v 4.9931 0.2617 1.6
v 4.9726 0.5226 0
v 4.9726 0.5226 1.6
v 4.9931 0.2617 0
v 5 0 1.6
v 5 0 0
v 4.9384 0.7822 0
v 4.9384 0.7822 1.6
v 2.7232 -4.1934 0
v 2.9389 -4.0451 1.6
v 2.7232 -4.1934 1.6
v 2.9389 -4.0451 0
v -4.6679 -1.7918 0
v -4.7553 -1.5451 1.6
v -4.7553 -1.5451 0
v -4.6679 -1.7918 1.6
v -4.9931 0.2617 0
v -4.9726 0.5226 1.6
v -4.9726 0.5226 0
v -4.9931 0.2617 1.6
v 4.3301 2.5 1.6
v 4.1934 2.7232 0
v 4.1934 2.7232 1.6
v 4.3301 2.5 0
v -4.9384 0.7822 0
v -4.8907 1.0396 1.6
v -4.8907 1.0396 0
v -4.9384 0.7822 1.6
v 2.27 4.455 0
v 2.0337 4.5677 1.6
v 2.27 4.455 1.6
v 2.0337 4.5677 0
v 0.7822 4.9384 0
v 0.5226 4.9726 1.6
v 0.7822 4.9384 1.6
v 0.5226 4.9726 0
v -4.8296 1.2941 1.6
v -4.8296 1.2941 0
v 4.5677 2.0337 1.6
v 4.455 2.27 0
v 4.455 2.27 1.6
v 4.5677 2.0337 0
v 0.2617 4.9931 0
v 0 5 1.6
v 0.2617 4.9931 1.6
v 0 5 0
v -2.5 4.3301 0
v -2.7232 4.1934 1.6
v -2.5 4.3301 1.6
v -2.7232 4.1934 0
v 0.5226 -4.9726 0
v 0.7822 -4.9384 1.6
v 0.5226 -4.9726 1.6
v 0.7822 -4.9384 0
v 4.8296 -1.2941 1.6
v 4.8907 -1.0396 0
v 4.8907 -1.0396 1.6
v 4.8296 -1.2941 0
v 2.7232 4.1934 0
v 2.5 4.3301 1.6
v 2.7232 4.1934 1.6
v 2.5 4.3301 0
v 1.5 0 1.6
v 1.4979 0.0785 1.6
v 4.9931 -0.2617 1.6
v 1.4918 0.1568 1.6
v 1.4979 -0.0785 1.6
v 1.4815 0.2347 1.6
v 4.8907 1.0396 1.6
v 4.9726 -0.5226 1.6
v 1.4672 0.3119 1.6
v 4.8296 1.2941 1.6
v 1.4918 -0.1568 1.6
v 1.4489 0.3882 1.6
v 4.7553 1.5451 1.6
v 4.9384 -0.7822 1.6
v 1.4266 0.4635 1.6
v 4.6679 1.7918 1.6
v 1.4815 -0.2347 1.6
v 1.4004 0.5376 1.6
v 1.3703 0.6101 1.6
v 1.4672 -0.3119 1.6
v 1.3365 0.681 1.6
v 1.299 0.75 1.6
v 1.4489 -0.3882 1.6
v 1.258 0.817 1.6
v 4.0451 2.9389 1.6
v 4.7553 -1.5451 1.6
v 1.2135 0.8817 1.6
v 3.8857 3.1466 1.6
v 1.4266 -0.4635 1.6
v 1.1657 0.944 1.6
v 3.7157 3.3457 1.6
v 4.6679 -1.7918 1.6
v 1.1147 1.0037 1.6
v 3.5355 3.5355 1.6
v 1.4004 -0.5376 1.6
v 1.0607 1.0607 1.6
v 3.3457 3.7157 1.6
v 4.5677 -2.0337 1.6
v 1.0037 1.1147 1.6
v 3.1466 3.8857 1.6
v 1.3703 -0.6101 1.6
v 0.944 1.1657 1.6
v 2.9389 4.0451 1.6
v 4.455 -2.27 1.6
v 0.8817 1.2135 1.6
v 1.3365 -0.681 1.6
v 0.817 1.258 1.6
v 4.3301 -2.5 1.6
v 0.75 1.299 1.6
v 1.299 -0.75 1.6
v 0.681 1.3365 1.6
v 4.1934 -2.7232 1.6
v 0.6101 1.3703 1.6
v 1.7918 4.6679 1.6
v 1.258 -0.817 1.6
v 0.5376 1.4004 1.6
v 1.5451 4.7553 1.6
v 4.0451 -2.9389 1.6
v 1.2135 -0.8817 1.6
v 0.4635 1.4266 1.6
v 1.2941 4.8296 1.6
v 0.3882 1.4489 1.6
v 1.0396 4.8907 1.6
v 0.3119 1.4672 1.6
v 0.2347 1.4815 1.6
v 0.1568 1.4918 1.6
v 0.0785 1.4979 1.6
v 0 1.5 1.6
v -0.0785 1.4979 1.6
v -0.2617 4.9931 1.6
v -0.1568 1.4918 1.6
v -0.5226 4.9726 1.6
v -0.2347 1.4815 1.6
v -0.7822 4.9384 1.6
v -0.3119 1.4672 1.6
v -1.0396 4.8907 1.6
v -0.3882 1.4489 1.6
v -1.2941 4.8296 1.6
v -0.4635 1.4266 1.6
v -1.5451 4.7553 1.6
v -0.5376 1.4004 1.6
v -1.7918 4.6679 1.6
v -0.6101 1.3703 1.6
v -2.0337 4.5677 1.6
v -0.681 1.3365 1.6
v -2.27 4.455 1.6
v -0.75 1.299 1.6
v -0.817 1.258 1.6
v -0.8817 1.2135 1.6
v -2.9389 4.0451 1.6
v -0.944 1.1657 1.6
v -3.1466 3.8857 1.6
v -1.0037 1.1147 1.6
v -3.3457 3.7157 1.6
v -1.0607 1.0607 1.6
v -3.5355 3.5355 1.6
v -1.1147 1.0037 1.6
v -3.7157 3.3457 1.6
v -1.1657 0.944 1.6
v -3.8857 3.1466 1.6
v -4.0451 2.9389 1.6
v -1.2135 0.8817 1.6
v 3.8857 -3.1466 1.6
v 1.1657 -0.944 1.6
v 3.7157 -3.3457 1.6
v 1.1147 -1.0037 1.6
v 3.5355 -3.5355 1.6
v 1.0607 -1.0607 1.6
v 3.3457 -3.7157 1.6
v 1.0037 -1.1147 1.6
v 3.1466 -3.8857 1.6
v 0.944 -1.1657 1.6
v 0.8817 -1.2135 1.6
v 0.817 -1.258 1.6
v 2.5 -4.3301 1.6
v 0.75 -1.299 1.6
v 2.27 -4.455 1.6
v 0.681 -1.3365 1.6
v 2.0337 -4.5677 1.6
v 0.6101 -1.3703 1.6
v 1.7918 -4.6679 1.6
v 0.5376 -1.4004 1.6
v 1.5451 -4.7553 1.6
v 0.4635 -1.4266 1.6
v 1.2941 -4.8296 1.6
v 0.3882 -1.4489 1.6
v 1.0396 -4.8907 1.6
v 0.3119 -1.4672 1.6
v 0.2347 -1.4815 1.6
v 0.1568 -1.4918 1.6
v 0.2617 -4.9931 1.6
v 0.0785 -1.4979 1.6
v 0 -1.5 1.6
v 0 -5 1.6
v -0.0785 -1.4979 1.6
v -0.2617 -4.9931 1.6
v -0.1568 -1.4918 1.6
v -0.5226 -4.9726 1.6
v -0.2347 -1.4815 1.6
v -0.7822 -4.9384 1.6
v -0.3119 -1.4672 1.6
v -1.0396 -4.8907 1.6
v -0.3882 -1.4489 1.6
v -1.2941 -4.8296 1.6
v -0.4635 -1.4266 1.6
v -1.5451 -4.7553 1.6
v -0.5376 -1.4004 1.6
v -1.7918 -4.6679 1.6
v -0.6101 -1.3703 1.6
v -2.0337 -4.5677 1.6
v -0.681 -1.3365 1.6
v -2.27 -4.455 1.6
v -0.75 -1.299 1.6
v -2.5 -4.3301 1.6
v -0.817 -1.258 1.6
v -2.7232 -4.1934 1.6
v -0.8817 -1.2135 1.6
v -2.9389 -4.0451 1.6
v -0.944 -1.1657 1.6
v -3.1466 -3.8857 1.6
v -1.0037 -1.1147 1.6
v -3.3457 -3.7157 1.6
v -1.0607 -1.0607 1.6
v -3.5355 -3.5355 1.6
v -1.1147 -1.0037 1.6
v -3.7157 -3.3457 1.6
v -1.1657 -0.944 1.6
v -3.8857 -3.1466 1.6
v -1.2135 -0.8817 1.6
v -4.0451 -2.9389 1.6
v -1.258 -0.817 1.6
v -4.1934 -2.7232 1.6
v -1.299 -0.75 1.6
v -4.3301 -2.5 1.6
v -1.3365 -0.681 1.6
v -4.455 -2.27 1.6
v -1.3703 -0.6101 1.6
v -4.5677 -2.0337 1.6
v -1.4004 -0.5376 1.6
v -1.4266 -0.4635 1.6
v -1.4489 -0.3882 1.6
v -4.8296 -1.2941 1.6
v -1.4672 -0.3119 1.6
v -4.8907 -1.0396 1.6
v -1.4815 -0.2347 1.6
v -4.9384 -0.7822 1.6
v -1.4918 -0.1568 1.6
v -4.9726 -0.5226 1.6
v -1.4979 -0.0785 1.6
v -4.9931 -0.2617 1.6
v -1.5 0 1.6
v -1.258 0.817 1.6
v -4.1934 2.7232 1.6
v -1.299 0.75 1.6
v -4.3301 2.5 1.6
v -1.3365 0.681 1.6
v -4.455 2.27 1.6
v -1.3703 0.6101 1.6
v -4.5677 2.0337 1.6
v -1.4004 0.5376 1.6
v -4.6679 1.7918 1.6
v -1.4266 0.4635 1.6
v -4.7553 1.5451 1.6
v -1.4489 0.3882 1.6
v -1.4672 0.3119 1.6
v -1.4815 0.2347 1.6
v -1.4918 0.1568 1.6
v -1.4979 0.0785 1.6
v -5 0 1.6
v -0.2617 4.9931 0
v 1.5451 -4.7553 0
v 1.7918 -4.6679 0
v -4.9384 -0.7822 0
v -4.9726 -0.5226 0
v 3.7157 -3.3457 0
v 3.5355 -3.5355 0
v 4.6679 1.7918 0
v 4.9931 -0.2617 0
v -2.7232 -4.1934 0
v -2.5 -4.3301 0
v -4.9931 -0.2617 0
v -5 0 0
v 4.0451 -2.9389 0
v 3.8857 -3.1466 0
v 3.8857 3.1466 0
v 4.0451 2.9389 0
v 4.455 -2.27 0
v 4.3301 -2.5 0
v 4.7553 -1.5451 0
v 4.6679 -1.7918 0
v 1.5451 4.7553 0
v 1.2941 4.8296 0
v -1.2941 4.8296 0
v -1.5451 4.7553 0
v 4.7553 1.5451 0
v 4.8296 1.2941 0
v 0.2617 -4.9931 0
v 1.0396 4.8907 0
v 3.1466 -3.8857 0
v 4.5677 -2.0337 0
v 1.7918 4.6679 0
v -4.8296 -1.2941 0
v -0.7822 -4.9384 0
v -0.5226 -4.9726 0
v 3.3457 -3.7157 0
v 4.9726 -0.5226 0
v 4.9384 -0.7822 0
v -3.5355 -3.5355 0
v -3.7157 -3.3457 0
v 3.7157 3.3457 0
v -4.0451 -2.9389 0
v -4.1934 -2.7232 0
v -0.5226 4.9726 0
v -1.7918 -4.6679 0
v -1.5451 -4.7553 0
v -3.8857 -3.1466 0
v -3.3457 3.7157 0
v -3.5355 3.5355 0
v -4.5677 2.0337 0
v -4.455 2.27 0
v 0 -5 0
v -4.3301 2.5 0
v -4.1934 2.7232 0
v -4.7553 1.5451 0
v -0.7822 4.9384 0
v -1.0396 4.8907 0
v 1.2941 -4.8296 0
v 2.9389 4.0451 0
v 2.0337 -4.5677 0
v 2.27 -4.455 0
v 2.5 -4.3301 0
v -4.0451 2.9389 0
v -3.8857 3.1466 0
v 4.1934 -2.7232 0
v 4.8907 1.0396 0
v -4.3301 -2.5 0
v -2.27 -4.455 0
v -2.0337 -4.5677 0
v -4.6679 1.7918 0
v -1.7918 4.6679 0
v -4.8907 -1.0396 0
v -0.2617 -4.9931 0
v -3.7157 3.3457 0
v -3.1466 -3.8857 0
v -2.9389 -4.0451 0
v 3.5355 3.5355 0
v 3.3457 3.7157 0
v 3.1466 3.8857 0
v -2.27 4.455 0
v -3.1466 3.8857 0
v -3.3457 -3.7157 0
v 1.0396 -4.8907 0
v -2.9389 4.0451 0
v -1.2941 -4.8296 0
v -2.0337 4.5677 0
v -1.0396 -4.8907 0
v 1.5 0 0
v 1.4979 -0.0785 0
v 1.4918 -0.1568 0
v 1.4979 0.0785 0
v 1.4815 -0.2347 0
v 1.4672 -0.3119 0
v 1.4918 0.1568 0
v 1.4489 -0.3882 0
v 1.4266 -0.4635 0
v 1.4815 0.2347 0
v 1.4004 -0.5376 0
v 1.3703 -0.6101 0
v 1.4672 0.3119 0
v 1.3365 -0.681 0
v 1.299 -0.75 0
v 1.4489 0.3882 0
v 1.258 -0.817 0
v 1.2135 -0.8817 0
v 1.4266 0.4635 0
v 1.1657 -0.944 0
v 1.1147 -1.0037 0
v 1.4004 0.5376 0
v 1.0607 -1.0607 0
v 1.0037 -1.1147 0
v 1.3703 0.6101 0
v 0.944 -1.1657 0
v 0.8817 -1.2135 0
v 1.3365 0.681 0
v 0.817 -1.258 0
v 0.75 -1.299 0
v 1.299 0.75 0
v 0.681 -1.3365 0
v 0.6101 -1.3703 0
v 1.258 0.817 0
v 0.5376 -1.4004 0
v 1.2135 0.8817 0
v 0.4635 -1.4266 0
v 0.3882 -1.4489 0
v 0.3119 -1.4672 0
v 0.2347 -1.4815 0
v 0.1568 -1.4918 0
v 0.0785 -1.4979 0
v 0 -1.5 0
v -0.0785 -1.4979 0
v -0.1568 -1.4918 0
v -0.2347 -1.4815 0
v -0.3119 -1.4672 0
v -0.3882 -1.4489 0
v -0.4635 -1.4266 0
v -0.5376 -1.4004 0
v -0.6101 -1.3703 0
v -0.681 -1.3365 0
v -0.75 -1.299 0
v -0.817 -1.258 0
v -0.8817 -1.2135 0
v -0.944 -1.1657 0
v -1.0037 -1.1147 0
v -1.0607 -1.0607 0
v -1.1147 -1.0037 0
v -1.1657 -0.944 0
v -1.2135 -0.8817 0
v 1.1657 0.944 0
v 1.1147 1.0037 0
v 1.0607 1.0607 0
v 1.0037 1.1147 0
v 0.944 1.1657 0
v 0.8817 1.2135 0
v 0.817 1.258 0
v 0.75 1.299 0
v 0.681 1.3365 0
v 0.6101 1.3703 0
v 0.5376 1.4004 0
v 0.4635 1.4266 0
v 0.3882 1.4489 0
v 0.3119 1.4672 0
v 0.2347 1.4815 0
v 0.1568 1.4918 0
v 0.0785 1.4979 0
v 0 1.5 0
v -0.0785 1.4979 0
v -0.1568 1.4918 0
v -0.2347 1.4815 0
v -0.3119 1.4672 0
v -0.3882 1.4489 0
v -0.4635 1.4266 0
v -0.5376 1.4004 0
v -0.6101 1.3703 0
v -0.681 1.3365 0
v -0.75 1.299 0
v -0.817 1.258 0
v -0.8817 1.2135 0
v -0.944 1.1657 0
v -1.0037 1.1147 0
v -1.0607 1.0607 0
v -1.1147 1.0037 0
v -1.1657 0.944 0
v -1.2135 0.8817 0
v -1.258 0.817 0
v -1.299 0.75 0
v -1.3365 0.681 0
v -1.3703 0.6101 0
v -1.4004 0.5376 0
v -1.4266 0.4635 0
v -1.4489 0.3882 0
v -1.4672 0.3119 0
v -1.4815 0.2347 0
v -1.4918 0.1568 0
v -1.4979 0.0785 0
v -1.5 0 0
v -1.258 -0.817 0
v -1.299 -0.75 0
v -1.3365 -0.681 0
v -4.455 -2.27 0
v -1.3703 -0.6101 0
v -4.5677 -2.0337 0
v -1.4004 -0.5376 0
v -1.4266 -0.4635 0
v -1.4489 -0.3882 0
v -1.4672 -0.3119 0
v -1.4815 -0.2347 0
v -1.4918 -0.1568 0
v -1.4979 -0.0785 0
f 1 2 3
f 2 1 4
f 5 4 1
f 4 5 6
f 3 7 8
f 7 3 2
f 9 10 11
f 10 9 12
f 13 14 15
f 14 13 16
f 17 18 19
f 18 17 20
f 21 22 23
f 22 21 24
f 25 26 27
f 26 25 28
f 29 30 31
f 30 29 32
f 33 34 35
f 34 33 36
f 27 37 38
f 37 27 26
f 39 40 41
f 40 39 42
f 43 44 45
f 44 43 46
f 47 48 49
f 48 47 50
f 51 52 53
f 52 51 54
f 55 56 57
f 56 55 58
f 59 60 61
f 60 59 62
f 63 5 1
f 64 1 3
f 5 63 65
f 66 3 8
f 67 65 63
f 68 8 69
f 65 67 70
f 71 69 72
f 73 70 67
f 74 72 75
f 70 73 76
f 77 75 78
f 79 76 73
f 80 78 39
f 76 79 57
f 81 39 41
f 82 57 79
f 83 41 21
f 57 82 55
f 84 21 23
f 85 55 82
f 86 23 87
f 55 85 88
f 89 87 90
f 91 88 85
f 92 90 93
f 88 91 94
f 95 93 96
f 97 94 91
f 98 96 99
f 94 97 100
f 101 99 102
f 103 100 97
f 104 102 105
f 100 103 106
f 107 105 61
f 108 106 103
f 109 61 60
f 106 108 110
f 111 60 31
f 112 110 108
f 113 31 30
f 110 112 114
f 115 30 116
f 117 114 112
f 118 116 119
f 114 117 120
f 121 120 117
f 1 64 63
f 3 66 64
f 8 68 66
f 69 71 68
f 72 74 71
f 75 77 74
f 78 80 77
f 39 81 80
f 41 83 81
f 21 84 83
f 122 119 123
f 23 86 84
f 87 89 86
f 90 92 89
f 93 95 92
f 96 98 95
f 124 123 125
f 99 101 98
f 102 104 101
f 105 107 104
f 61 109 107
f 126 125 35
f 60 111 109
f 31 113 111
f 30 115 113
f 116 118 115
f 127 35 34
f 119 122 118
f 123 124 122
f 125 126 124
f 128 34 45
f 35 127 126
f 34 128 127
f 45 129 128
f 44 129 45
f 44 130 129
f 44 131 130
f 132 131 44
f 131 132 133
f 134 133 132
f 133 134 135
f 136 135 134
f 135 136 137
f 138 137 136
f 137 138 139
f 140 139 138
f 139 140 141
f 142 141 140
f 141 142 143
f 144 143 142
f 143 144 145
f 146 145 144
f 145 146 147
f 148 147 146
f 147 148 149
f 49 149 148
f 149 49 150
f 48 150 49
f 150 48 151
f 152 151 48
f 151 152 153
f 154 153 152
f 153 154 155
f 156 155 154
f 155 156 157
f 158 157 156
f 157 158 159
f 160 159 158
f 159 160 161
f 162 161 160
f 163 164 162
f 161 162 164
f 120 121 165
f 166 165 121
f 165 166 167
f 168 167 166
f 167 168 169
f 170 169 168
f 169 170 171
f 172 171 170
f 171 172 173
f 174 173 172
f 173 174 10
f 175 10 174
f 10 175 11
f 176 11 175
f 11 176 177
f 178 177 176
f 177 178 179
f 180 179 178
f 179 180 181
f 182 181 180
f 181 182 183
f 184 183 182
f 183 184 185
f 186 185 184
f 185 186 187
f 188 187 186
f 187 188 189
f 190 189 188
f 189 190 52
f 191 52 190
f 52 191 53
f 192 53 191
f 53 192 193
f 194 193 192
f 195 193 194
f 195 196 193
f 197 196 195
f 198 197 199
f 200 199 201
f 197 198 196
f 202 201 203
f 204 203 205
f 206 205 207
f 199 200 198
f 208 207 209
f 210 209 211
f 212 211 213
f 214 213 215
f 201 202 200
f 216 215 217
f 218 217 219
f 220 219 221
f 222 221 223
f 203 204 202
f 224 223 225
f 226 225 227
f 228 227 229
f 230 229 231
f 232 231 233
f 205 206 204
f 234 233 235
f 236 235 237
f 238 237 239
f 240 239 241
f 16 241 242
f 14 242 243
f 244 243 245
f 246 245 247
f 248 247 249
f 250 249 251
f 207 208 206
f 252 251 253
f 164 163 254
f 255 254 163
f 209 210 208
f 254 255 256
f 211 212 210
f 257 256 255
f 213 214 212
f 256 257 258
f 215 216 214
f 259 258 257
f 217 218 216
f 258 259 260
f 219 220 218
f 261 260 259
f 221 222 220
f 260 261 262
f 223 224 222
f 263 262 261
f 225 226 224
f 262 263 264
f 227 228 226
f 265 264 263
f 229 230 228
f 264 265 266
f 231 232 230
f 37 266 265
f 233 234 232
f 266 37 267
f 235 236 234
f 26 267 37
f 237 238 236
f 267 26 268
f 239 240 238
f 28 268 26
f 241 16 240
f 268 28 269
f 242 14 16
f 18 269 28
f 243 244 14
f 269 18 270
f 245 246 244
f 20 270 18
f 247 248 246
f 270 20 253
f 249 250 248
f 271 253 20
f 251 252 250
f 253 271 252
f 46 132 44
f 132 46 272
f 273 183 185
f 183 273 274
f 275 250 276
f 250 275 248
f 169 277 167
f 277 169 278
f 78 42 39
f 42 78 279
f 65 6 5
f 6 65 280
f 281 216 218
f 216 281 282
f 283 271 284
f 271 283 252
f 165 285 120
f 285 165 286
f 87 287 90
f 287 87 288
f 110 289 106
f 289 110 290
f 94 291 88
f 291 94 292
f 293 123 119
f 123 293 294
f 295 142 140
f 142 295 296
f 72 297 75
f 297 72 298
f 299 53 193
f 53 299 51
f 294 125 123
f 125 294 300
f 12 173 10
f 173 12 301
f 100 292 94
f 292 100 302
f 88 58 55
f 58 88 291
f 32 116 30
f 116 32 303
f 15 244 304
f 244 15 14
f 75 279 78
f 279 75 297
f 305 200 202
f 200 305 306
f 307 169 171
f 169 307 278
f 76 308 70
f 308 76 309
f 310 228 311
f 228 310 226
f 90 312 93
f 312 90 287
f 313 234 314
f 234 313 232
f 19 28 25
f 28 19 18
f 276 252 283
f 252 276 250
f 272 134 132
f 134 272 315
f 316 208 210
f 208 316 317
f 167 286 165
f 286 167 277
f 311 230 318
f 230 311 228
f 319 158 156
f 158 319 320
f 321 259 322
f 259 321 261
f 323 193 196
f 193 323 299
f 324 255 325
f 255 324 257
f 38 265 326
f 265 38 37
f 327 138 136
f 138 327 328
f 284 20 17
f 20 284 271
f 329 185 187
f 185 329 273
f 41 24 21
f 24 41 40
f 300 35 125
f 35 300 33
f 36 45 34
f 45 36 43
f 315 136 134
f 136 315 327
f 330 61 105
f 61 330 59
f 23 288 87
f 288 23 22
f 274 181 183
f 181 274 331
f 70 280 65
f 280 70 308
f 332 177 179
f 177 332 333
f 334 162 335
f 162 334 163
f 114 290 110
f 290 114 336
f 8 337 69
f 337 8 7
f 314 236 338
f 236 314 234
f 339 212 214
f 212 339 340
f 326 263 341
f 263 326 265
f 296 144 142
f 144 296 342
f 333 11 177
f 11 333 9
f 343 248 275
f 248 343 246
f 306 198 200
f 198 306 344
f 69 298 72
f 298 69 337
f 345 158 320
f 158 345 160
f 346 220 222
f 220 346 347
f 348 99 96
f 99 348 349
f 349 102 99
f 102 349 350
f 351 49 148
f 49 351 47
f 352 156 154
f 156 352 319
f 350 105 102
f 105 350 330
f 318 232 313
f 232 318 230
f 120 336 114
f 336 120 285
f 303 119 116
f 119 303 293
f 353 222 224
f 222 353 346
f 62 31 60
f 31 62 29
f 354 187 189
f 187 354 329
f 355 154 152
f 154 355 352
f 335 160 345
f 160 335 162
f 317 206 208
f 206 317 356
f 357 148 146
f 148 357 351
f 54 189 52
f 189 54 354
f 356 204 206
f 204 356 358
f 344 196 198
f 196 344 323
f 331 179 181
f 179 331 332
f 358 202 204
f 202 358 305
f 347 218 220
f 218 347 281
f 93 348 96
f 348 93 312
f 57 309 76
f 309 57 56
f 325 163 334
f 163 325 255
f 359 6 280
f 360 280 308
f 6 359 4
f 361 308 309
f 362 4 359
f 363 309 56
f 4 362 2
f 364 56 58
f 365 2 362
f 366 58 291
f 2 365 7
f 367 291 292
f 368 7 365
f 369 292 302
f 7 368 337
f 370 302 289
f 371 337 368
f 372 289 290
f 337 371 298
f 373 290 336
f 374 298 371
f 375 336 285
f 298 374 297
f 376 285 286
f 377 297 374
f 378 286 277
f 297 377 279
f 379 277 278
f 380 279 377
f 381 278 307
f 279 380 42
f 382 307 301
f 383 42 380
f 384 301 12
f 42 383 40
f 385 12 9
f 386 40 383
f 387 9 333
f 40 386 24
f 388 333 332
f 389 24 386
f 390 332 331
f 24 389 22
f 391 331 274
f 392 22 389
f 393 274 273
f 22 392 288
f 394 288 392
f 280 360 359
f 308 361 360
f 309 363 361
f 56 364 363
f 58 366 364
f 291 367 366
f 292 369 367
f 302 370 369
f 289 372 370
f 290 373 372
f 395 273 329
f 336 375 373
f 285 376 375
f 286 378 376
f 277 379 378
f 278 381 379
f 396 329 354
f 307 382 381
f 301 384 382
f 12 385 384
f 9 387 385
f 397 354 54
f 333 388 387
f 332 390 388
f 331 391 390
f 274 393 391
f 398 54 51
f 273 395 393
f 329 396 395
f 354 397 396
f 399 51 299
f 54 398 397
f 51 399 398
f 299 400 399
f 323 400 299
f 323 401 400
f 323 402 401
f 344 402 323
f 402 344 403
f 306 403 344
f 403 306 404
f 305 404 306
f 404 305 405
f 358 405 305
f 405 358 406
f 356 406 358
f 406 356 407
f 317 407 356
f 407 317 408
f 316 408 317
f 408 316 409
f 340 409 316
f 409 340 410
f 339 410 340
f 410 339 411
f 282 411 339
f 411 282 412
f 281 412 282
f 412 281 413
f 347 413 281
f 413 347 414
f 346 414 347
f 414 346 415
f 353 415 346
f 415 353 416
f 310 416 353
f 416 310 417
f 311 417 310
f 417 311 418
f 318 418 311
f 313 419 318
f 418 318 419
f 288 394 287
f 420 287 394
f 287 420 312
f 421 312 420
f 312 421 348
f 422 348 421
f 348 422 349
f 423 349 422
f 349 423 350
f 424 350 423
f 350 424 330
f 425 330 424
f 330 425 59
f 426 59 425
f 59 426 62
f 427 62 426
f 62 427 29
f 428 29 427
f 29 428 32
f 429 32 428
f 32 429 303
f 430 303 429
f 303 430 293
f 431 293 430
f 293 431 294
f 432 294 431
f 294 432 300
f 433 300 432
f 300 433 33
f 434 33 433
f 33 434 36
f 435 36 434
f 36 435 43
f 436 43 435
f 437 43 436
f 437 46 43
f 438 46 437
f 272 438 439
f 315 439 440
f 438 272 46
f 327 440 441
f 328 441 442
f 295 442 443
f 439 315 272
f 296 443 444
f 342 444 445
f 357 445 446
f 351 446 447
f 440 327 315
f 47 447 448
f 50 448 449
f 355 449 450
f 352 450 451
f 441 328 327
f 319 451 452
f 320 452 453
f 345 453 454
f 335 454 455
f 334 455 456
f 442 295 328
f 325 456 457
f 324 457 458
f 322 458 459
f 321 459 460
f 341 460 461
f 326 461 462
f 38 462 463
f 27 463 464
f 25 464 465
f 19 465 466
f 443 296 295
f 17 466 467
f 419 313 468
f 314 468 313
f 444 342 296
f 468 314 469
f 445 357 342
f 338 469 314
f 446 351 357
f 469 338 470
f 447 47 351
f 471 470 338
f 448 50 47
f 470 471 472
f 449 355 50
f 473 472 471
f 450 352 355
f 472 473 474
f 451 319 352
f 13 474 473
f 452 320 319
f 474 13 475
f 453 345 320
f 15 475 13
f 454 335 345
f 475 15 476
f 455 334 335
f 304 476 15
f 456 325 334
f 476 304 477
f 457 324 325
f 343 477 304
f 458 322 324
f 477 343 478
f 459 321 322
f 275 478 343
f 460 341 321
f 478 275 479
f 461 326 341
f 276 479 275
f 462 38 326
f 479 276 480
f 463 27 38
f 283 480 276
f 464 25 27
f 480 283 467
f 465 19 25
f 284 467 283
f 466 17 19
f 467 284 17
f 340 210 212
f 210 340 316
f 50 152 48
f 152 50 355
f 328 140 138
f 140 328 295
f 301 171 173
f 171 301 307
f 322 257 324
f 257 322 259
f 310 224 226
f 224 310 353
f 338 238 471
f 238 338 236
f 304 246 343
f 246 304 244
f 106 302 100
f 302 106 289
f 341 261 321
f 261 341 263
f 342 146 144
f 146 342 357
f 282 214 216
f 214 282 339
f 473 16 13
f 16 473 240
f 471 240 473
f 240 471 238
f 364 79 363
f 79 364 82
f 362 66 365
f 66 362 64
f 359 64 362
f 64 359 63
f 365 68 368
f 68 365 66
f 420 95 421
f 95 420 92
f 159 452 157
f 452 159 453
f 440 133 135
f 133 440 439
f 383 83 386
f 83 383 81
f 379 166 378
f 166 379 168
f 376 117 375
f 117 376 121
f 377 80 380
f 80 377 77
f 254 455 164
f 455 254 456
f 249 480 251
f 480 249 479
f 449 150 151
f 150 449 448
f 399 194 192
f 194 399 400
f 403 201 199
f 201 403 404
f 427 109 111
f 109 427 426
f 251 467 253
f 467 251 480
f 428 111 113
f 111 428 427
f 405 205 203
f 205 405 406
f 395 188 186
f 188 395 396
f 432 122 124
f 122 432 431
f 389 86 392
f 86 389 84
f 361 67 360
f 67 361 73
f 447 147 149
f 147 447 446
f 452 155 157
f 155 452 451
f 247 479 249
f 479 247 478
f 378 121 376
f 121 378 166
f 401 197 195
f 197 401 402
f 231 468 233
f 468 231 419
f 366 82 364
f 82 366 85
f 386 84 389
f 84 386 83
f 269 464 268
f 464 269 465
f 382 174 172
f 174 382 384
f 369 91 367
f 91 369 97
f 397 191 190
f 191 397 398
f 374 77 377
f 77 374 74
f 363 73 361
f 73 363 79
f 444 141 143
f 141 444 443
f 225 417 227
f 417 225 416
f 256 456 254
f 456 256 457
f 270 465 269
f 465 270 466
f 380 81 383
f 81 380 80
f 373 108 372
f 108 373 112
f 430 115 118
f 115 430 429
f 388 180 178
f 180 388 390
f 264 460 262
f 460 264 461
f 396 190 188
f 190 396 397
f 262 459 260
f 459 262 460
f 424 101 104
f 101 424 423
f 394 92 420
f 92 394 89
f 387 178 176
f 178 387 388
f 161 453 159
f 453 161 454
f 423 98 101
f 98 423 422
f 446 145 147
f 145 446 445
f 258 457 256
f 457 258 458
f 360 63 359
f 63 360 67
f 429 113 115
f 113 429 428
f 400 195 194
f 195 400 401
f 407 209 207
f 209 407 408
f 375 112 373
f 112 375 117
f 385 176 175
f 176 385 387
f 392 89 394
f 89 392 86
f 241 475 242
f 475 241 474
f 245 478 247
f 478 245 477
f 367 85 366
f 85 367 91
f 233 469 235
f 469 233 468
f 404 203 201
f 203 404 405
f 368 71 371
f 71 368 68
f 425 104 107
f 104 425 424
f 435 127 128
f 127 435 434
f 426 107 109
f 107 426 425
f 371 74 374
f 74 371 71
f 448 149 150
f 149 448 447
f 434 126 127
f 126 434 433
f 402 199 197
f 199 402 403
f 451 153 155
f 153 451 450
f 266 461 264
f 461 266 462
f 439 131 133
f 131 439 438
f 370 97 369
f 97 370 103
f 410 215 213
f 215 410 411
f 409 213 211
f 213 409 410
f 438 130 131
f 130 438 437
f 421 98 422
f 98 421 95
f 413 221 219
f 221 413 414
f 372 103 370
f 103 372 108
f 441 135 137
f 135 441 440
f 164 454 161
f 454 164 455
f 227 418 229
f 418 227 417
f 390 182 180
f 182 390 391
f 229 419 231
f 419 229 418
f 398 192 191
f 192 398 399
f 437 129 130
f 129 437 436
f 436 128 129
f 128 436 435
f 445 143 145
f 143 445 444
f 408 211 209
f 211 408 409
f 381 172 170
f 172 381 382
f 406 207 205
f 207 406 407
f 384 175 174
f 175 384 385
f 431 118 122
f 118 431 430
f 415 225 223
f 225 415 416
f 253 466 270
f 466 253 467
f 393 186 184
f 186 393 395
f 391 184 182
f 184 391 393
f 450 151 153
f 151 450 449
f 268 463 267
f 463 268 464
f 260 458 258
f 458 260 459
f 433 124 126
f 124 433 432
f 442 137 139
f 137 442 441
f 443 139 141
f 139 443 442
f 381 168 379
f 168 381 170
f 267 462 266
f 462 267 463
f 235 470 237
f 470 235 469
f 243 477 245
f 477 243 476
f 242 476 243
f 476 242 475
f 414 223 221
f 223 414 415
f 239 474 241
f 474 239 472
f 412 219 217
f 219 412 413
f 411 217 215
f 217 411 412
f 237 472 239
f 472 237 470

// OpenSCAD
$fn = 120;

outer_d = 25;
inner_d = 3;
height = 120;

cover_h = 10;
screw_h = 7;
screw_d = 1.5;
screw_head_d = 3.5;
screw_head_h = 1;

module tube(height, outer_diameter, inner_diameter){
    difference(){
        cylinder(h=height, d=outer_diameter);
        cylinder(h=height, d=inner_diameter);
    }
}

module bottom(){
    difference(){
        cylinder(h=3, d=outer_d);
        cylinder(h=1.6, d=10);
        cylinder(h=3, d=3);
        translate([0,0,2])
        cube([5, 5, 0.8], true);
    }
}

module sensor_place(){
    difference(){
        translate([-3, -3, -1])
        cube([6,6,4.5]);
        //sensor
        rotate([0, 180,0])
        translate([-2.3, -2.3, -2.5])
        difference(){
            cube([4.6, 4.7, 2.5]);
            cube([4.6, 2.95, 0.8]);
        }
        translate([0,-0.5,3])
        cylinder(h=3, d=3,center=true);
        //contacts
        translate([-2.3,2.3,0])
        cube([4.6,1,2]);
        translate([-2.3, -1.6,-1])
        cube([4.6, 5, 2]);
    }
}

module middle(){
    difference(){
        cylinder(h=2, d=outer_d);
        cylinder(h=2, d=inner_d);
    }
    rotate([0,0,-90])
    translate([(outer_d - 3)/2 - (screw_d + 2)/2, 0, 2])
    difference(){
        cylinder(h=10, d = screw_d + 4);
        translate([0,0,2])
        cylinder(h=10, d = screw_d);
    }    
    translate([0,0.5,5])
    rotate([0,180,0])
    sensor_place();
}
module cover(){
    // Плоская часть крышки
    difference(){
        cylinder(h=2, d=outer_d);
        cylinder(h=2, d=5);
        translate([(outer_d - 3)/2 - (screw_d + 2)/2, 0, 0])
        cylinder(h=cover_h, d = screw_head_d);
    }
    // Круглая часть крышки
    translate([0,0,2])
    difference(){
        cylinder(h=cover_h, d= outer_d - 2);
        cylinder(h=cover_h, d=outer_d - 5 );
        translate([(outer_d - 3)/2 - (screw_d + 2)/2, 0, 0])
        cylinder(h=cover_h, d = screw_head_d);
    }

    //Screw channel
    translate([(outer_d - 3)/2 - (screw_d + 2)/2, 0, 2])
    difference(){
        cylinder(h=cover_h, d=screw_head_d + 1);
        cylinder(h=cover_h, d=screw_d);
        cylinder(h=cover_h - 2, d = screw_head_d);
    }
}

module glass_holder(){
    difference(){
        cylinder(h = 1.6, d = 10);
        cylinder(h = 1.6, d = 3);
    }
}
module main_cylinder(){
    difference(){
        tube(120, outer_d, inner_d);
        cylinder(h=3, d = outer_d);
        translate([0,0,97])
        cylinder(h=27, d = outer_d -2);
    }     
    bottom();
    translate([0,0,97])
    middle();
}
module block(){
    translate([-outer_d/2, 0,0])
    cube([outer_d, outer_d/2, height]);
}

glass_holder();
